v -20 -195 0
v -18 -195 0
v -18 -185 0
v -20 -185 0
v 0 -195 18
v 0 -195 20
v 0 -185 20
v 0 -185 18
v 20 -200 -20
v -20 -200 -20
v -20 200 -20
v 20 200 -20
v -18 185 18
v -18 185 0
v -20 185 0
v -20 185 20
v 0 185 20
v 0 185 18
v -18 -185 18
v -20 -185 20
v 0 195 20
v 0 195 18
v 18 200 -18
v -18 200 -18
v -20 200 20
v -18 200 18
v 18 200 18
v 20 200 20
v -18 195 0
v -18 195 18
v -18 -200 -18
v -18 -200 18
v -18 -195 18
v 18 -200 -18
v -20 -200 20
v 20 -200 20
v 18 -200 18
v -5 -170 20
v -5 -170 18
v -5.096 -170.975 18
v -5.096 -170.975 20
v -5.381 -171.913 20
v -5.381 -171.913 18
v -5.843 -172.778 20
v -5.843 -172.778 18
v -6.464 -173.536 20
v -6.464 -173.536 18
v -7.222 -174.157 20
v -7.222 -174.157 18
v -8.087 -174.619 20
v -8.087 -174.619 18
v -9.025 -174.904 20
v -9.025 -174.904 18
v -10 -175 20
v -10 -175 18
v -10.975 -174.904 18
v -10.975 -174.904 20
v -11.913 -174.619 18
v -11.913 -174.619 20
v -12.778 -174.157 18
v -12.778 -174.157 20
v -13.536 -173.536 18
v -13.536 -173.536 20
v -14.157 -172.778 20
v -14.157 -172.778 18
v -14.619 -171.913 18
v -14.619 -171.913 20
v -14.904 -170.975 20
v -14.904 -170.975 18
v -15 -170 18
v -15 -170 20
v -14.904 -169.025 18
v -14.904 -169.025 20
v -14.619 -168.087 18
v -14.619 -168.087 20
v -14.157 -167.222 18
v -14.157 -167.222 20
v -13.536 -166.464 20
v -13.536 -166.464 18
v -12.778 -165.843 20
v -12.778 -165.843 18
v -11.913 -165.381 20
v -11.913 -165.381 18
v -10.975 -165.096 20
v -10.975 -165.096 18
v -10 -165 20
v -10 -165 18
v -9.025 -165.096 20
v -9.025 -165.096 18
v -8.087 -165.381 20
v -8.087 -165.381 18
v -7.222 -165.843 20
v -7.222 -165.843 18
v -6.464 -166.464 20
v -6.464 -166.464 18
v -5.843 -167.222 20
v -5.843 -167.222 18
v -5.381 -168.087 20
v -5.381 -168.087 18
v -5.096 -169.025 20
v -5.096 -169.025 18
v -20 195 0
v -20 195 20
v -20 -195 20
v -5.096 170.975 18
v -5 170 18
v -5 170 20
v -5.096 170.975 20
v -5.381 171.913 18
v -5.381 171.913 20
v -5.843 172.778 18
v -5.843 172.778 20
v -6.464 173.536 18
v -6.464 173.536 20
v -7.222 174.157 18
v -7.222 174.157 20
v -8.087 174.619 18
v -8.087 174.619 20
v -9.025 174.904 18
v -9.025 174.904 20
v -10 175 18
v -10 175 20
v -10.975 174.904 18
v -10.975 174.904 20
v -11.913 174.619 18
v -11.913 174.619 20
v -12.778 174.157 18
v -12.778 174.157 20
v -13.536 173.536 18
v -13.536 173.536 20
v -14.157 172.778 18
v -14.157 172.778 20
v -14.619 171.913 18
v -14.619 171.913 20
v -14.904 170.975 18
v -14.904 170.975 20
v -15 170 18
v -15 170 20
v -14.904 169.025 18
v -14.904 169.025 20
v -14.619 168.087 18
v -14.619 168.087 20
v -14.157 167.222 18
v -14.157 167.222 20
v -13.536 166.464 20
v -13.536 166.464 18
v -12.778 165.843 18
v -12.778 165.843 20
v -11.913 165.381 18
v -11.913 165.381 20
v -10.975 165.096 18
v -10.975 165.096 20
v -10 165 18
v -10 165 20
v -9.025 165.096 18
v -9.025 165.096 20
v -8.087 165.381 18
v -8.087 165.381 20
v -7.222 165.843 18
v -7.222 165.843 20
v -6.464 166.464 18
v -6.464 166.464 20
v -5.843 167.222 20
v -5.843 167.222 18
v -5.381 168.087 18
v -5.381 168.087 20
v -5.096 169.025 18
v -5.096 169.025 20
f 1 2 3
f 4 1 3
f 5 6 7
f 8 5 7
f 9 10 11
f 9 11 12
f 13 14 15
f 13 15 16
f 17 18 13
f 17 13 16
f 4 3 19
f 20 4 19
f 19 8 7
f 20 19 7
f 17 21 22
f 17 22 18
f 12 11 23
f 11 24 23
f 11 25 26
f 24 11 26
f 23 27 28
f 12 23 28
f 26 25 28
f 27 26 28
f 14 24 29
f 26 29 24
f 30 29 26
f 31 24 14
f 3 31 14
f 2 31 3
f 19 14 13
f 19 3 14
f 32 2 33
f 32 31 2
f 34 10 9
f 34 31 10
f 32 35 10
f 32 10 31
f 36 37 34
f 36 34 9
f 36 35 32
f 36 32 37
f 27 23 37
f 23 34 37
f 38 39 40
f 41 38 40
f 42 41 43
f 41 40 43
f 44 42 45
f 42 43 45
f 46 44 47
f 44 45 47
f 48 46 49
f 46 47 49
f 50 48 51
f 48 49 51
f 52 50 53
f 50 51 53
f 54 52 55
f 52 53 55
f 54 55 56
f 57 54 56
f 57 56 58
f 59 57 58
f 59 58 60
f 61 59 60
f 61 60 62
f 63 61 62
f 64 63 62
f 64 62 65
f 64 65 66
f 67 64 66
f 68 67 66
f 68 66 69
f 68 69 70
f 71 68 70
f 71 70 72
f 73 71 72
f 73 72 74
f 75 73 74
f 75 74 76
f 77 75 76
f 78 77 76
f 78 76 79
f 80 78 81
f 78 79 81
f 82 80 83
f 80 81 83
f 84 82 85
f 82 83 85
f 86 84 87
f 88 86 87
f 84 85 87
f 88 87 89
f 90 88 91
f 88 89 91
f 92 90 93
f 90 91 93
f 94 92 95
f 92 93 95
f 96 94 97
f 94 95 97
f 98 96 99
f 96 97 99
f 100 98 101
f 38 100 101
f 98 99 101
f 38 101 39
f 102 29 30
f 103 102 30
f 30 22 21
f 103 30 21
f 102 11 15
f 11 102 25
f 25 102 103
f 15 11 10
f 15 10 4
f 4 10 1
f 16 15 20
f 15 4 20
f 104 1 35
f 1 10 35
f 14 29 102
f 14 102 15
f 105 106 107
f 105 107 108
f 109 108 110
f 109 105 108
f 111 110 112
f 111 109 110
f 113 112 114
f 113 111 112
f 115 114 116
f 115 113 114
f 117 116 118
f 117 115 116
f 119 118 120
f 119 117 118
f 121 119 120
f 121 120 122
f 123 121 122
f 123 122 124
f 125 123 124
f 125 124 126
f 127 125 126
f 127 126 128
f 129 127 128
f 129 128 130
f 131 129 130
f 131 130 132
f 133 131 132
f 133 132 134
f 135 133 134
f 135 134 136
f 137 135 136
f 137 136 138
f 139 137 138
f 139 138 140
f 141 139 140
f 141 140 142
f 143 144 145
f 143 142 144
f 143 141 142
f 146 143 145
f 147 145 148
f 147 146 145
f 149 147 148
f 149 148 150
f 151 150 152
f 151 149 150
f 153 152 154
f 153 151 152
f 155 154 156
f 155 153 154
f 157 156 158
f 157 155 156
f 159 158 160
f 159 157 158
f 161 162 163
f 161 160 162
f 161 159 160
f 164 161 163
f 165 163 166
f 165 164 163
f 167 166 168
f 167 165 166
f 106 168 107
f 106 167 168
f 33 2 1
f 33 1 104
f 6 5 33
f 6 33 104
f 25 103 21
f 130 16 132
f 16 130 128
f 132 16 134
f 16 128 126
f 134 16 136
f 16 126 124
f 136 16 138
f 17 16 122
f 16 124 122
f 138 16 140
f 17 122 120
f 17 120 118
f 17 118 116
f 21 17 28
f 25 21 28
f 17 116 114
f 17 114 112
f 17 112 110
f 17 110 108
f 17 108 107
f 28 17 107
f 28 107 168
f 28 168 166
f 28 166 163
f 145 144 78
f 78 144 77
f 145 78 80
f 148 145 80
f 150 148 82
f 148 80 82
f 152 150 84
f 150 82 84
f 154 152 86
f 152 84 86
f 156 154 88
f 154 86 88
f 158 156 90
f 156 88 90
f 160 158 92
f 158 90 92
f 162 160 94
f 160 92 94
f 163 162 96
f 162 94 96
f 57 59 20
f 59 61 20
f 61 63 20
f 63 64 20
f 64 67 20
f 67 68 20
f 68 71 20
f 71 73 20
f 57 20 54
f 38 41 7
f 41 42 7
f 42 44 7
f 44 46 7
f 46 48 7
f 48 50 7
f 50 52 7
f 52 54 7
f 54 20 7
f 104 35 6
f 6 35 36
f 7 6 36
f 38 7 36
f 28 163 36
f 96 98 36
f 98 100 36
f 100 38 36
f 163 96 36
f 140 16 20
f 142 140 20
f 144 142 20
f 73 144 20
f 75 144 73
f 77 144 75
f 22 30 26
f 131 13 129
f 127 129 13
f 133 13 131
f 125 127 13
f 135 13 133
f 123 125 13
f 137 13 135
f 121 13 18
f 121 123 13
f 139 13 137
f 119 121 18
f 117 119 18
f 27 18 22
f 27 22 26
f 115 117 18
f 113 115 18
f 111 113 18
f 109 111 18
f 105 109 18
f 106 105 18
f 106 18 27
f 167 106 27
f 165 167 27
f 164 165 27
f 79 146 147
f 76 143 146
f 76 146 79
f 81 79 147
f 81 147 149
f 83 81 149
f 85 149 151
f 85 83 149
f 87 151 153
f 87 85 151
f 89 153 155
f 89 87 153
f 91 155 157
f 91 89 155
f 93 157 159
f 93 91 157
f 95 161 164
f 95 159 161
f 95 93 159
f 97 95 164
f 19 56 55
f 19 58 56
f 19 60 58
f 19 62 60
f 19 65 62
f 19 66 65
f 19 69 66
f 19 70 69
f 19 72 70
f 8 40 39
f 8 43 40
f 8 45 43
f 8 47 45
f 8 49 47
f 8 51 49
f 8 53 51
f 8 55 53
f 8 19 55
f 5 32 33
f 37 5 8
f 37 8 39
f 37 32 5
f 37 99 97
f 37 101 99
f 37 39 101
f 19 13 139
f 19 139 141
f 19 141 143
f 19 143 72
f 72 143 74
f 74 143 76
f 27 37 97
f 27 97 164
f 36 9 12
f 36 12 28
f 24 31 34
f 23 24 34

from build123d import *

# Parameters (mm, degrees)
F0_W     = 40
F0_H     = 40
F0_W_2   = 36
F0_H_2   = 36
F1_DEPTH = 200
F2_W     = 10
F2_H     = 30
F3_DEPTH = 20.001
F4_R     = 5
F5_DEPTH = 20.001


# Not quite as in the source:
# - a pattern or mirror of a feature is missing from the dataset's text; its kind, count and spacing are read off the source's solid


with BuildPart() as f1:
    # F0 (on Front) → F1 (new body, symmetric)
    with BuildSketch(Plane.XZ):
        Rectangle(F0_W, F0_H)
        Rectangle(F0_W_2, F0_H_2, mode=Mode.SUBTRACT)
    extrude(amount=F1_DEPTH, both=True)

    # F2 (on Right) → F3 (cut, through all)
    with BuildSketch(Plane.YZ):
        with Locations((-190, 15)):
            Rectangle(F2_W, F2_H)
    f3 = extrude(amount=-F3_DEPTH, mode=Mode.SUBTRACT)

    # F3_copies: F3 across plane
    add(f3.mirror(Plane.ZX), mode=Mode.SUBTRACT)

    # F4 (on Top) → F5 (cut, through all)
    with BuildSketch(Plane.XY):
        with Locations((-10, 170)):
            Circle(F4_R)
    f5 = extrude(amount=F5_DEPTH, mode=Mode.SUBTRACT)

    # F5_copies: F5 across plane
    add(f5.mirror(Plane(origin=(0, 0, 0), x_dir=(0, 0, -1), z_dir=(0, -1, 0))), mode=Mode.SUBTRACT)


solid = f1.part
